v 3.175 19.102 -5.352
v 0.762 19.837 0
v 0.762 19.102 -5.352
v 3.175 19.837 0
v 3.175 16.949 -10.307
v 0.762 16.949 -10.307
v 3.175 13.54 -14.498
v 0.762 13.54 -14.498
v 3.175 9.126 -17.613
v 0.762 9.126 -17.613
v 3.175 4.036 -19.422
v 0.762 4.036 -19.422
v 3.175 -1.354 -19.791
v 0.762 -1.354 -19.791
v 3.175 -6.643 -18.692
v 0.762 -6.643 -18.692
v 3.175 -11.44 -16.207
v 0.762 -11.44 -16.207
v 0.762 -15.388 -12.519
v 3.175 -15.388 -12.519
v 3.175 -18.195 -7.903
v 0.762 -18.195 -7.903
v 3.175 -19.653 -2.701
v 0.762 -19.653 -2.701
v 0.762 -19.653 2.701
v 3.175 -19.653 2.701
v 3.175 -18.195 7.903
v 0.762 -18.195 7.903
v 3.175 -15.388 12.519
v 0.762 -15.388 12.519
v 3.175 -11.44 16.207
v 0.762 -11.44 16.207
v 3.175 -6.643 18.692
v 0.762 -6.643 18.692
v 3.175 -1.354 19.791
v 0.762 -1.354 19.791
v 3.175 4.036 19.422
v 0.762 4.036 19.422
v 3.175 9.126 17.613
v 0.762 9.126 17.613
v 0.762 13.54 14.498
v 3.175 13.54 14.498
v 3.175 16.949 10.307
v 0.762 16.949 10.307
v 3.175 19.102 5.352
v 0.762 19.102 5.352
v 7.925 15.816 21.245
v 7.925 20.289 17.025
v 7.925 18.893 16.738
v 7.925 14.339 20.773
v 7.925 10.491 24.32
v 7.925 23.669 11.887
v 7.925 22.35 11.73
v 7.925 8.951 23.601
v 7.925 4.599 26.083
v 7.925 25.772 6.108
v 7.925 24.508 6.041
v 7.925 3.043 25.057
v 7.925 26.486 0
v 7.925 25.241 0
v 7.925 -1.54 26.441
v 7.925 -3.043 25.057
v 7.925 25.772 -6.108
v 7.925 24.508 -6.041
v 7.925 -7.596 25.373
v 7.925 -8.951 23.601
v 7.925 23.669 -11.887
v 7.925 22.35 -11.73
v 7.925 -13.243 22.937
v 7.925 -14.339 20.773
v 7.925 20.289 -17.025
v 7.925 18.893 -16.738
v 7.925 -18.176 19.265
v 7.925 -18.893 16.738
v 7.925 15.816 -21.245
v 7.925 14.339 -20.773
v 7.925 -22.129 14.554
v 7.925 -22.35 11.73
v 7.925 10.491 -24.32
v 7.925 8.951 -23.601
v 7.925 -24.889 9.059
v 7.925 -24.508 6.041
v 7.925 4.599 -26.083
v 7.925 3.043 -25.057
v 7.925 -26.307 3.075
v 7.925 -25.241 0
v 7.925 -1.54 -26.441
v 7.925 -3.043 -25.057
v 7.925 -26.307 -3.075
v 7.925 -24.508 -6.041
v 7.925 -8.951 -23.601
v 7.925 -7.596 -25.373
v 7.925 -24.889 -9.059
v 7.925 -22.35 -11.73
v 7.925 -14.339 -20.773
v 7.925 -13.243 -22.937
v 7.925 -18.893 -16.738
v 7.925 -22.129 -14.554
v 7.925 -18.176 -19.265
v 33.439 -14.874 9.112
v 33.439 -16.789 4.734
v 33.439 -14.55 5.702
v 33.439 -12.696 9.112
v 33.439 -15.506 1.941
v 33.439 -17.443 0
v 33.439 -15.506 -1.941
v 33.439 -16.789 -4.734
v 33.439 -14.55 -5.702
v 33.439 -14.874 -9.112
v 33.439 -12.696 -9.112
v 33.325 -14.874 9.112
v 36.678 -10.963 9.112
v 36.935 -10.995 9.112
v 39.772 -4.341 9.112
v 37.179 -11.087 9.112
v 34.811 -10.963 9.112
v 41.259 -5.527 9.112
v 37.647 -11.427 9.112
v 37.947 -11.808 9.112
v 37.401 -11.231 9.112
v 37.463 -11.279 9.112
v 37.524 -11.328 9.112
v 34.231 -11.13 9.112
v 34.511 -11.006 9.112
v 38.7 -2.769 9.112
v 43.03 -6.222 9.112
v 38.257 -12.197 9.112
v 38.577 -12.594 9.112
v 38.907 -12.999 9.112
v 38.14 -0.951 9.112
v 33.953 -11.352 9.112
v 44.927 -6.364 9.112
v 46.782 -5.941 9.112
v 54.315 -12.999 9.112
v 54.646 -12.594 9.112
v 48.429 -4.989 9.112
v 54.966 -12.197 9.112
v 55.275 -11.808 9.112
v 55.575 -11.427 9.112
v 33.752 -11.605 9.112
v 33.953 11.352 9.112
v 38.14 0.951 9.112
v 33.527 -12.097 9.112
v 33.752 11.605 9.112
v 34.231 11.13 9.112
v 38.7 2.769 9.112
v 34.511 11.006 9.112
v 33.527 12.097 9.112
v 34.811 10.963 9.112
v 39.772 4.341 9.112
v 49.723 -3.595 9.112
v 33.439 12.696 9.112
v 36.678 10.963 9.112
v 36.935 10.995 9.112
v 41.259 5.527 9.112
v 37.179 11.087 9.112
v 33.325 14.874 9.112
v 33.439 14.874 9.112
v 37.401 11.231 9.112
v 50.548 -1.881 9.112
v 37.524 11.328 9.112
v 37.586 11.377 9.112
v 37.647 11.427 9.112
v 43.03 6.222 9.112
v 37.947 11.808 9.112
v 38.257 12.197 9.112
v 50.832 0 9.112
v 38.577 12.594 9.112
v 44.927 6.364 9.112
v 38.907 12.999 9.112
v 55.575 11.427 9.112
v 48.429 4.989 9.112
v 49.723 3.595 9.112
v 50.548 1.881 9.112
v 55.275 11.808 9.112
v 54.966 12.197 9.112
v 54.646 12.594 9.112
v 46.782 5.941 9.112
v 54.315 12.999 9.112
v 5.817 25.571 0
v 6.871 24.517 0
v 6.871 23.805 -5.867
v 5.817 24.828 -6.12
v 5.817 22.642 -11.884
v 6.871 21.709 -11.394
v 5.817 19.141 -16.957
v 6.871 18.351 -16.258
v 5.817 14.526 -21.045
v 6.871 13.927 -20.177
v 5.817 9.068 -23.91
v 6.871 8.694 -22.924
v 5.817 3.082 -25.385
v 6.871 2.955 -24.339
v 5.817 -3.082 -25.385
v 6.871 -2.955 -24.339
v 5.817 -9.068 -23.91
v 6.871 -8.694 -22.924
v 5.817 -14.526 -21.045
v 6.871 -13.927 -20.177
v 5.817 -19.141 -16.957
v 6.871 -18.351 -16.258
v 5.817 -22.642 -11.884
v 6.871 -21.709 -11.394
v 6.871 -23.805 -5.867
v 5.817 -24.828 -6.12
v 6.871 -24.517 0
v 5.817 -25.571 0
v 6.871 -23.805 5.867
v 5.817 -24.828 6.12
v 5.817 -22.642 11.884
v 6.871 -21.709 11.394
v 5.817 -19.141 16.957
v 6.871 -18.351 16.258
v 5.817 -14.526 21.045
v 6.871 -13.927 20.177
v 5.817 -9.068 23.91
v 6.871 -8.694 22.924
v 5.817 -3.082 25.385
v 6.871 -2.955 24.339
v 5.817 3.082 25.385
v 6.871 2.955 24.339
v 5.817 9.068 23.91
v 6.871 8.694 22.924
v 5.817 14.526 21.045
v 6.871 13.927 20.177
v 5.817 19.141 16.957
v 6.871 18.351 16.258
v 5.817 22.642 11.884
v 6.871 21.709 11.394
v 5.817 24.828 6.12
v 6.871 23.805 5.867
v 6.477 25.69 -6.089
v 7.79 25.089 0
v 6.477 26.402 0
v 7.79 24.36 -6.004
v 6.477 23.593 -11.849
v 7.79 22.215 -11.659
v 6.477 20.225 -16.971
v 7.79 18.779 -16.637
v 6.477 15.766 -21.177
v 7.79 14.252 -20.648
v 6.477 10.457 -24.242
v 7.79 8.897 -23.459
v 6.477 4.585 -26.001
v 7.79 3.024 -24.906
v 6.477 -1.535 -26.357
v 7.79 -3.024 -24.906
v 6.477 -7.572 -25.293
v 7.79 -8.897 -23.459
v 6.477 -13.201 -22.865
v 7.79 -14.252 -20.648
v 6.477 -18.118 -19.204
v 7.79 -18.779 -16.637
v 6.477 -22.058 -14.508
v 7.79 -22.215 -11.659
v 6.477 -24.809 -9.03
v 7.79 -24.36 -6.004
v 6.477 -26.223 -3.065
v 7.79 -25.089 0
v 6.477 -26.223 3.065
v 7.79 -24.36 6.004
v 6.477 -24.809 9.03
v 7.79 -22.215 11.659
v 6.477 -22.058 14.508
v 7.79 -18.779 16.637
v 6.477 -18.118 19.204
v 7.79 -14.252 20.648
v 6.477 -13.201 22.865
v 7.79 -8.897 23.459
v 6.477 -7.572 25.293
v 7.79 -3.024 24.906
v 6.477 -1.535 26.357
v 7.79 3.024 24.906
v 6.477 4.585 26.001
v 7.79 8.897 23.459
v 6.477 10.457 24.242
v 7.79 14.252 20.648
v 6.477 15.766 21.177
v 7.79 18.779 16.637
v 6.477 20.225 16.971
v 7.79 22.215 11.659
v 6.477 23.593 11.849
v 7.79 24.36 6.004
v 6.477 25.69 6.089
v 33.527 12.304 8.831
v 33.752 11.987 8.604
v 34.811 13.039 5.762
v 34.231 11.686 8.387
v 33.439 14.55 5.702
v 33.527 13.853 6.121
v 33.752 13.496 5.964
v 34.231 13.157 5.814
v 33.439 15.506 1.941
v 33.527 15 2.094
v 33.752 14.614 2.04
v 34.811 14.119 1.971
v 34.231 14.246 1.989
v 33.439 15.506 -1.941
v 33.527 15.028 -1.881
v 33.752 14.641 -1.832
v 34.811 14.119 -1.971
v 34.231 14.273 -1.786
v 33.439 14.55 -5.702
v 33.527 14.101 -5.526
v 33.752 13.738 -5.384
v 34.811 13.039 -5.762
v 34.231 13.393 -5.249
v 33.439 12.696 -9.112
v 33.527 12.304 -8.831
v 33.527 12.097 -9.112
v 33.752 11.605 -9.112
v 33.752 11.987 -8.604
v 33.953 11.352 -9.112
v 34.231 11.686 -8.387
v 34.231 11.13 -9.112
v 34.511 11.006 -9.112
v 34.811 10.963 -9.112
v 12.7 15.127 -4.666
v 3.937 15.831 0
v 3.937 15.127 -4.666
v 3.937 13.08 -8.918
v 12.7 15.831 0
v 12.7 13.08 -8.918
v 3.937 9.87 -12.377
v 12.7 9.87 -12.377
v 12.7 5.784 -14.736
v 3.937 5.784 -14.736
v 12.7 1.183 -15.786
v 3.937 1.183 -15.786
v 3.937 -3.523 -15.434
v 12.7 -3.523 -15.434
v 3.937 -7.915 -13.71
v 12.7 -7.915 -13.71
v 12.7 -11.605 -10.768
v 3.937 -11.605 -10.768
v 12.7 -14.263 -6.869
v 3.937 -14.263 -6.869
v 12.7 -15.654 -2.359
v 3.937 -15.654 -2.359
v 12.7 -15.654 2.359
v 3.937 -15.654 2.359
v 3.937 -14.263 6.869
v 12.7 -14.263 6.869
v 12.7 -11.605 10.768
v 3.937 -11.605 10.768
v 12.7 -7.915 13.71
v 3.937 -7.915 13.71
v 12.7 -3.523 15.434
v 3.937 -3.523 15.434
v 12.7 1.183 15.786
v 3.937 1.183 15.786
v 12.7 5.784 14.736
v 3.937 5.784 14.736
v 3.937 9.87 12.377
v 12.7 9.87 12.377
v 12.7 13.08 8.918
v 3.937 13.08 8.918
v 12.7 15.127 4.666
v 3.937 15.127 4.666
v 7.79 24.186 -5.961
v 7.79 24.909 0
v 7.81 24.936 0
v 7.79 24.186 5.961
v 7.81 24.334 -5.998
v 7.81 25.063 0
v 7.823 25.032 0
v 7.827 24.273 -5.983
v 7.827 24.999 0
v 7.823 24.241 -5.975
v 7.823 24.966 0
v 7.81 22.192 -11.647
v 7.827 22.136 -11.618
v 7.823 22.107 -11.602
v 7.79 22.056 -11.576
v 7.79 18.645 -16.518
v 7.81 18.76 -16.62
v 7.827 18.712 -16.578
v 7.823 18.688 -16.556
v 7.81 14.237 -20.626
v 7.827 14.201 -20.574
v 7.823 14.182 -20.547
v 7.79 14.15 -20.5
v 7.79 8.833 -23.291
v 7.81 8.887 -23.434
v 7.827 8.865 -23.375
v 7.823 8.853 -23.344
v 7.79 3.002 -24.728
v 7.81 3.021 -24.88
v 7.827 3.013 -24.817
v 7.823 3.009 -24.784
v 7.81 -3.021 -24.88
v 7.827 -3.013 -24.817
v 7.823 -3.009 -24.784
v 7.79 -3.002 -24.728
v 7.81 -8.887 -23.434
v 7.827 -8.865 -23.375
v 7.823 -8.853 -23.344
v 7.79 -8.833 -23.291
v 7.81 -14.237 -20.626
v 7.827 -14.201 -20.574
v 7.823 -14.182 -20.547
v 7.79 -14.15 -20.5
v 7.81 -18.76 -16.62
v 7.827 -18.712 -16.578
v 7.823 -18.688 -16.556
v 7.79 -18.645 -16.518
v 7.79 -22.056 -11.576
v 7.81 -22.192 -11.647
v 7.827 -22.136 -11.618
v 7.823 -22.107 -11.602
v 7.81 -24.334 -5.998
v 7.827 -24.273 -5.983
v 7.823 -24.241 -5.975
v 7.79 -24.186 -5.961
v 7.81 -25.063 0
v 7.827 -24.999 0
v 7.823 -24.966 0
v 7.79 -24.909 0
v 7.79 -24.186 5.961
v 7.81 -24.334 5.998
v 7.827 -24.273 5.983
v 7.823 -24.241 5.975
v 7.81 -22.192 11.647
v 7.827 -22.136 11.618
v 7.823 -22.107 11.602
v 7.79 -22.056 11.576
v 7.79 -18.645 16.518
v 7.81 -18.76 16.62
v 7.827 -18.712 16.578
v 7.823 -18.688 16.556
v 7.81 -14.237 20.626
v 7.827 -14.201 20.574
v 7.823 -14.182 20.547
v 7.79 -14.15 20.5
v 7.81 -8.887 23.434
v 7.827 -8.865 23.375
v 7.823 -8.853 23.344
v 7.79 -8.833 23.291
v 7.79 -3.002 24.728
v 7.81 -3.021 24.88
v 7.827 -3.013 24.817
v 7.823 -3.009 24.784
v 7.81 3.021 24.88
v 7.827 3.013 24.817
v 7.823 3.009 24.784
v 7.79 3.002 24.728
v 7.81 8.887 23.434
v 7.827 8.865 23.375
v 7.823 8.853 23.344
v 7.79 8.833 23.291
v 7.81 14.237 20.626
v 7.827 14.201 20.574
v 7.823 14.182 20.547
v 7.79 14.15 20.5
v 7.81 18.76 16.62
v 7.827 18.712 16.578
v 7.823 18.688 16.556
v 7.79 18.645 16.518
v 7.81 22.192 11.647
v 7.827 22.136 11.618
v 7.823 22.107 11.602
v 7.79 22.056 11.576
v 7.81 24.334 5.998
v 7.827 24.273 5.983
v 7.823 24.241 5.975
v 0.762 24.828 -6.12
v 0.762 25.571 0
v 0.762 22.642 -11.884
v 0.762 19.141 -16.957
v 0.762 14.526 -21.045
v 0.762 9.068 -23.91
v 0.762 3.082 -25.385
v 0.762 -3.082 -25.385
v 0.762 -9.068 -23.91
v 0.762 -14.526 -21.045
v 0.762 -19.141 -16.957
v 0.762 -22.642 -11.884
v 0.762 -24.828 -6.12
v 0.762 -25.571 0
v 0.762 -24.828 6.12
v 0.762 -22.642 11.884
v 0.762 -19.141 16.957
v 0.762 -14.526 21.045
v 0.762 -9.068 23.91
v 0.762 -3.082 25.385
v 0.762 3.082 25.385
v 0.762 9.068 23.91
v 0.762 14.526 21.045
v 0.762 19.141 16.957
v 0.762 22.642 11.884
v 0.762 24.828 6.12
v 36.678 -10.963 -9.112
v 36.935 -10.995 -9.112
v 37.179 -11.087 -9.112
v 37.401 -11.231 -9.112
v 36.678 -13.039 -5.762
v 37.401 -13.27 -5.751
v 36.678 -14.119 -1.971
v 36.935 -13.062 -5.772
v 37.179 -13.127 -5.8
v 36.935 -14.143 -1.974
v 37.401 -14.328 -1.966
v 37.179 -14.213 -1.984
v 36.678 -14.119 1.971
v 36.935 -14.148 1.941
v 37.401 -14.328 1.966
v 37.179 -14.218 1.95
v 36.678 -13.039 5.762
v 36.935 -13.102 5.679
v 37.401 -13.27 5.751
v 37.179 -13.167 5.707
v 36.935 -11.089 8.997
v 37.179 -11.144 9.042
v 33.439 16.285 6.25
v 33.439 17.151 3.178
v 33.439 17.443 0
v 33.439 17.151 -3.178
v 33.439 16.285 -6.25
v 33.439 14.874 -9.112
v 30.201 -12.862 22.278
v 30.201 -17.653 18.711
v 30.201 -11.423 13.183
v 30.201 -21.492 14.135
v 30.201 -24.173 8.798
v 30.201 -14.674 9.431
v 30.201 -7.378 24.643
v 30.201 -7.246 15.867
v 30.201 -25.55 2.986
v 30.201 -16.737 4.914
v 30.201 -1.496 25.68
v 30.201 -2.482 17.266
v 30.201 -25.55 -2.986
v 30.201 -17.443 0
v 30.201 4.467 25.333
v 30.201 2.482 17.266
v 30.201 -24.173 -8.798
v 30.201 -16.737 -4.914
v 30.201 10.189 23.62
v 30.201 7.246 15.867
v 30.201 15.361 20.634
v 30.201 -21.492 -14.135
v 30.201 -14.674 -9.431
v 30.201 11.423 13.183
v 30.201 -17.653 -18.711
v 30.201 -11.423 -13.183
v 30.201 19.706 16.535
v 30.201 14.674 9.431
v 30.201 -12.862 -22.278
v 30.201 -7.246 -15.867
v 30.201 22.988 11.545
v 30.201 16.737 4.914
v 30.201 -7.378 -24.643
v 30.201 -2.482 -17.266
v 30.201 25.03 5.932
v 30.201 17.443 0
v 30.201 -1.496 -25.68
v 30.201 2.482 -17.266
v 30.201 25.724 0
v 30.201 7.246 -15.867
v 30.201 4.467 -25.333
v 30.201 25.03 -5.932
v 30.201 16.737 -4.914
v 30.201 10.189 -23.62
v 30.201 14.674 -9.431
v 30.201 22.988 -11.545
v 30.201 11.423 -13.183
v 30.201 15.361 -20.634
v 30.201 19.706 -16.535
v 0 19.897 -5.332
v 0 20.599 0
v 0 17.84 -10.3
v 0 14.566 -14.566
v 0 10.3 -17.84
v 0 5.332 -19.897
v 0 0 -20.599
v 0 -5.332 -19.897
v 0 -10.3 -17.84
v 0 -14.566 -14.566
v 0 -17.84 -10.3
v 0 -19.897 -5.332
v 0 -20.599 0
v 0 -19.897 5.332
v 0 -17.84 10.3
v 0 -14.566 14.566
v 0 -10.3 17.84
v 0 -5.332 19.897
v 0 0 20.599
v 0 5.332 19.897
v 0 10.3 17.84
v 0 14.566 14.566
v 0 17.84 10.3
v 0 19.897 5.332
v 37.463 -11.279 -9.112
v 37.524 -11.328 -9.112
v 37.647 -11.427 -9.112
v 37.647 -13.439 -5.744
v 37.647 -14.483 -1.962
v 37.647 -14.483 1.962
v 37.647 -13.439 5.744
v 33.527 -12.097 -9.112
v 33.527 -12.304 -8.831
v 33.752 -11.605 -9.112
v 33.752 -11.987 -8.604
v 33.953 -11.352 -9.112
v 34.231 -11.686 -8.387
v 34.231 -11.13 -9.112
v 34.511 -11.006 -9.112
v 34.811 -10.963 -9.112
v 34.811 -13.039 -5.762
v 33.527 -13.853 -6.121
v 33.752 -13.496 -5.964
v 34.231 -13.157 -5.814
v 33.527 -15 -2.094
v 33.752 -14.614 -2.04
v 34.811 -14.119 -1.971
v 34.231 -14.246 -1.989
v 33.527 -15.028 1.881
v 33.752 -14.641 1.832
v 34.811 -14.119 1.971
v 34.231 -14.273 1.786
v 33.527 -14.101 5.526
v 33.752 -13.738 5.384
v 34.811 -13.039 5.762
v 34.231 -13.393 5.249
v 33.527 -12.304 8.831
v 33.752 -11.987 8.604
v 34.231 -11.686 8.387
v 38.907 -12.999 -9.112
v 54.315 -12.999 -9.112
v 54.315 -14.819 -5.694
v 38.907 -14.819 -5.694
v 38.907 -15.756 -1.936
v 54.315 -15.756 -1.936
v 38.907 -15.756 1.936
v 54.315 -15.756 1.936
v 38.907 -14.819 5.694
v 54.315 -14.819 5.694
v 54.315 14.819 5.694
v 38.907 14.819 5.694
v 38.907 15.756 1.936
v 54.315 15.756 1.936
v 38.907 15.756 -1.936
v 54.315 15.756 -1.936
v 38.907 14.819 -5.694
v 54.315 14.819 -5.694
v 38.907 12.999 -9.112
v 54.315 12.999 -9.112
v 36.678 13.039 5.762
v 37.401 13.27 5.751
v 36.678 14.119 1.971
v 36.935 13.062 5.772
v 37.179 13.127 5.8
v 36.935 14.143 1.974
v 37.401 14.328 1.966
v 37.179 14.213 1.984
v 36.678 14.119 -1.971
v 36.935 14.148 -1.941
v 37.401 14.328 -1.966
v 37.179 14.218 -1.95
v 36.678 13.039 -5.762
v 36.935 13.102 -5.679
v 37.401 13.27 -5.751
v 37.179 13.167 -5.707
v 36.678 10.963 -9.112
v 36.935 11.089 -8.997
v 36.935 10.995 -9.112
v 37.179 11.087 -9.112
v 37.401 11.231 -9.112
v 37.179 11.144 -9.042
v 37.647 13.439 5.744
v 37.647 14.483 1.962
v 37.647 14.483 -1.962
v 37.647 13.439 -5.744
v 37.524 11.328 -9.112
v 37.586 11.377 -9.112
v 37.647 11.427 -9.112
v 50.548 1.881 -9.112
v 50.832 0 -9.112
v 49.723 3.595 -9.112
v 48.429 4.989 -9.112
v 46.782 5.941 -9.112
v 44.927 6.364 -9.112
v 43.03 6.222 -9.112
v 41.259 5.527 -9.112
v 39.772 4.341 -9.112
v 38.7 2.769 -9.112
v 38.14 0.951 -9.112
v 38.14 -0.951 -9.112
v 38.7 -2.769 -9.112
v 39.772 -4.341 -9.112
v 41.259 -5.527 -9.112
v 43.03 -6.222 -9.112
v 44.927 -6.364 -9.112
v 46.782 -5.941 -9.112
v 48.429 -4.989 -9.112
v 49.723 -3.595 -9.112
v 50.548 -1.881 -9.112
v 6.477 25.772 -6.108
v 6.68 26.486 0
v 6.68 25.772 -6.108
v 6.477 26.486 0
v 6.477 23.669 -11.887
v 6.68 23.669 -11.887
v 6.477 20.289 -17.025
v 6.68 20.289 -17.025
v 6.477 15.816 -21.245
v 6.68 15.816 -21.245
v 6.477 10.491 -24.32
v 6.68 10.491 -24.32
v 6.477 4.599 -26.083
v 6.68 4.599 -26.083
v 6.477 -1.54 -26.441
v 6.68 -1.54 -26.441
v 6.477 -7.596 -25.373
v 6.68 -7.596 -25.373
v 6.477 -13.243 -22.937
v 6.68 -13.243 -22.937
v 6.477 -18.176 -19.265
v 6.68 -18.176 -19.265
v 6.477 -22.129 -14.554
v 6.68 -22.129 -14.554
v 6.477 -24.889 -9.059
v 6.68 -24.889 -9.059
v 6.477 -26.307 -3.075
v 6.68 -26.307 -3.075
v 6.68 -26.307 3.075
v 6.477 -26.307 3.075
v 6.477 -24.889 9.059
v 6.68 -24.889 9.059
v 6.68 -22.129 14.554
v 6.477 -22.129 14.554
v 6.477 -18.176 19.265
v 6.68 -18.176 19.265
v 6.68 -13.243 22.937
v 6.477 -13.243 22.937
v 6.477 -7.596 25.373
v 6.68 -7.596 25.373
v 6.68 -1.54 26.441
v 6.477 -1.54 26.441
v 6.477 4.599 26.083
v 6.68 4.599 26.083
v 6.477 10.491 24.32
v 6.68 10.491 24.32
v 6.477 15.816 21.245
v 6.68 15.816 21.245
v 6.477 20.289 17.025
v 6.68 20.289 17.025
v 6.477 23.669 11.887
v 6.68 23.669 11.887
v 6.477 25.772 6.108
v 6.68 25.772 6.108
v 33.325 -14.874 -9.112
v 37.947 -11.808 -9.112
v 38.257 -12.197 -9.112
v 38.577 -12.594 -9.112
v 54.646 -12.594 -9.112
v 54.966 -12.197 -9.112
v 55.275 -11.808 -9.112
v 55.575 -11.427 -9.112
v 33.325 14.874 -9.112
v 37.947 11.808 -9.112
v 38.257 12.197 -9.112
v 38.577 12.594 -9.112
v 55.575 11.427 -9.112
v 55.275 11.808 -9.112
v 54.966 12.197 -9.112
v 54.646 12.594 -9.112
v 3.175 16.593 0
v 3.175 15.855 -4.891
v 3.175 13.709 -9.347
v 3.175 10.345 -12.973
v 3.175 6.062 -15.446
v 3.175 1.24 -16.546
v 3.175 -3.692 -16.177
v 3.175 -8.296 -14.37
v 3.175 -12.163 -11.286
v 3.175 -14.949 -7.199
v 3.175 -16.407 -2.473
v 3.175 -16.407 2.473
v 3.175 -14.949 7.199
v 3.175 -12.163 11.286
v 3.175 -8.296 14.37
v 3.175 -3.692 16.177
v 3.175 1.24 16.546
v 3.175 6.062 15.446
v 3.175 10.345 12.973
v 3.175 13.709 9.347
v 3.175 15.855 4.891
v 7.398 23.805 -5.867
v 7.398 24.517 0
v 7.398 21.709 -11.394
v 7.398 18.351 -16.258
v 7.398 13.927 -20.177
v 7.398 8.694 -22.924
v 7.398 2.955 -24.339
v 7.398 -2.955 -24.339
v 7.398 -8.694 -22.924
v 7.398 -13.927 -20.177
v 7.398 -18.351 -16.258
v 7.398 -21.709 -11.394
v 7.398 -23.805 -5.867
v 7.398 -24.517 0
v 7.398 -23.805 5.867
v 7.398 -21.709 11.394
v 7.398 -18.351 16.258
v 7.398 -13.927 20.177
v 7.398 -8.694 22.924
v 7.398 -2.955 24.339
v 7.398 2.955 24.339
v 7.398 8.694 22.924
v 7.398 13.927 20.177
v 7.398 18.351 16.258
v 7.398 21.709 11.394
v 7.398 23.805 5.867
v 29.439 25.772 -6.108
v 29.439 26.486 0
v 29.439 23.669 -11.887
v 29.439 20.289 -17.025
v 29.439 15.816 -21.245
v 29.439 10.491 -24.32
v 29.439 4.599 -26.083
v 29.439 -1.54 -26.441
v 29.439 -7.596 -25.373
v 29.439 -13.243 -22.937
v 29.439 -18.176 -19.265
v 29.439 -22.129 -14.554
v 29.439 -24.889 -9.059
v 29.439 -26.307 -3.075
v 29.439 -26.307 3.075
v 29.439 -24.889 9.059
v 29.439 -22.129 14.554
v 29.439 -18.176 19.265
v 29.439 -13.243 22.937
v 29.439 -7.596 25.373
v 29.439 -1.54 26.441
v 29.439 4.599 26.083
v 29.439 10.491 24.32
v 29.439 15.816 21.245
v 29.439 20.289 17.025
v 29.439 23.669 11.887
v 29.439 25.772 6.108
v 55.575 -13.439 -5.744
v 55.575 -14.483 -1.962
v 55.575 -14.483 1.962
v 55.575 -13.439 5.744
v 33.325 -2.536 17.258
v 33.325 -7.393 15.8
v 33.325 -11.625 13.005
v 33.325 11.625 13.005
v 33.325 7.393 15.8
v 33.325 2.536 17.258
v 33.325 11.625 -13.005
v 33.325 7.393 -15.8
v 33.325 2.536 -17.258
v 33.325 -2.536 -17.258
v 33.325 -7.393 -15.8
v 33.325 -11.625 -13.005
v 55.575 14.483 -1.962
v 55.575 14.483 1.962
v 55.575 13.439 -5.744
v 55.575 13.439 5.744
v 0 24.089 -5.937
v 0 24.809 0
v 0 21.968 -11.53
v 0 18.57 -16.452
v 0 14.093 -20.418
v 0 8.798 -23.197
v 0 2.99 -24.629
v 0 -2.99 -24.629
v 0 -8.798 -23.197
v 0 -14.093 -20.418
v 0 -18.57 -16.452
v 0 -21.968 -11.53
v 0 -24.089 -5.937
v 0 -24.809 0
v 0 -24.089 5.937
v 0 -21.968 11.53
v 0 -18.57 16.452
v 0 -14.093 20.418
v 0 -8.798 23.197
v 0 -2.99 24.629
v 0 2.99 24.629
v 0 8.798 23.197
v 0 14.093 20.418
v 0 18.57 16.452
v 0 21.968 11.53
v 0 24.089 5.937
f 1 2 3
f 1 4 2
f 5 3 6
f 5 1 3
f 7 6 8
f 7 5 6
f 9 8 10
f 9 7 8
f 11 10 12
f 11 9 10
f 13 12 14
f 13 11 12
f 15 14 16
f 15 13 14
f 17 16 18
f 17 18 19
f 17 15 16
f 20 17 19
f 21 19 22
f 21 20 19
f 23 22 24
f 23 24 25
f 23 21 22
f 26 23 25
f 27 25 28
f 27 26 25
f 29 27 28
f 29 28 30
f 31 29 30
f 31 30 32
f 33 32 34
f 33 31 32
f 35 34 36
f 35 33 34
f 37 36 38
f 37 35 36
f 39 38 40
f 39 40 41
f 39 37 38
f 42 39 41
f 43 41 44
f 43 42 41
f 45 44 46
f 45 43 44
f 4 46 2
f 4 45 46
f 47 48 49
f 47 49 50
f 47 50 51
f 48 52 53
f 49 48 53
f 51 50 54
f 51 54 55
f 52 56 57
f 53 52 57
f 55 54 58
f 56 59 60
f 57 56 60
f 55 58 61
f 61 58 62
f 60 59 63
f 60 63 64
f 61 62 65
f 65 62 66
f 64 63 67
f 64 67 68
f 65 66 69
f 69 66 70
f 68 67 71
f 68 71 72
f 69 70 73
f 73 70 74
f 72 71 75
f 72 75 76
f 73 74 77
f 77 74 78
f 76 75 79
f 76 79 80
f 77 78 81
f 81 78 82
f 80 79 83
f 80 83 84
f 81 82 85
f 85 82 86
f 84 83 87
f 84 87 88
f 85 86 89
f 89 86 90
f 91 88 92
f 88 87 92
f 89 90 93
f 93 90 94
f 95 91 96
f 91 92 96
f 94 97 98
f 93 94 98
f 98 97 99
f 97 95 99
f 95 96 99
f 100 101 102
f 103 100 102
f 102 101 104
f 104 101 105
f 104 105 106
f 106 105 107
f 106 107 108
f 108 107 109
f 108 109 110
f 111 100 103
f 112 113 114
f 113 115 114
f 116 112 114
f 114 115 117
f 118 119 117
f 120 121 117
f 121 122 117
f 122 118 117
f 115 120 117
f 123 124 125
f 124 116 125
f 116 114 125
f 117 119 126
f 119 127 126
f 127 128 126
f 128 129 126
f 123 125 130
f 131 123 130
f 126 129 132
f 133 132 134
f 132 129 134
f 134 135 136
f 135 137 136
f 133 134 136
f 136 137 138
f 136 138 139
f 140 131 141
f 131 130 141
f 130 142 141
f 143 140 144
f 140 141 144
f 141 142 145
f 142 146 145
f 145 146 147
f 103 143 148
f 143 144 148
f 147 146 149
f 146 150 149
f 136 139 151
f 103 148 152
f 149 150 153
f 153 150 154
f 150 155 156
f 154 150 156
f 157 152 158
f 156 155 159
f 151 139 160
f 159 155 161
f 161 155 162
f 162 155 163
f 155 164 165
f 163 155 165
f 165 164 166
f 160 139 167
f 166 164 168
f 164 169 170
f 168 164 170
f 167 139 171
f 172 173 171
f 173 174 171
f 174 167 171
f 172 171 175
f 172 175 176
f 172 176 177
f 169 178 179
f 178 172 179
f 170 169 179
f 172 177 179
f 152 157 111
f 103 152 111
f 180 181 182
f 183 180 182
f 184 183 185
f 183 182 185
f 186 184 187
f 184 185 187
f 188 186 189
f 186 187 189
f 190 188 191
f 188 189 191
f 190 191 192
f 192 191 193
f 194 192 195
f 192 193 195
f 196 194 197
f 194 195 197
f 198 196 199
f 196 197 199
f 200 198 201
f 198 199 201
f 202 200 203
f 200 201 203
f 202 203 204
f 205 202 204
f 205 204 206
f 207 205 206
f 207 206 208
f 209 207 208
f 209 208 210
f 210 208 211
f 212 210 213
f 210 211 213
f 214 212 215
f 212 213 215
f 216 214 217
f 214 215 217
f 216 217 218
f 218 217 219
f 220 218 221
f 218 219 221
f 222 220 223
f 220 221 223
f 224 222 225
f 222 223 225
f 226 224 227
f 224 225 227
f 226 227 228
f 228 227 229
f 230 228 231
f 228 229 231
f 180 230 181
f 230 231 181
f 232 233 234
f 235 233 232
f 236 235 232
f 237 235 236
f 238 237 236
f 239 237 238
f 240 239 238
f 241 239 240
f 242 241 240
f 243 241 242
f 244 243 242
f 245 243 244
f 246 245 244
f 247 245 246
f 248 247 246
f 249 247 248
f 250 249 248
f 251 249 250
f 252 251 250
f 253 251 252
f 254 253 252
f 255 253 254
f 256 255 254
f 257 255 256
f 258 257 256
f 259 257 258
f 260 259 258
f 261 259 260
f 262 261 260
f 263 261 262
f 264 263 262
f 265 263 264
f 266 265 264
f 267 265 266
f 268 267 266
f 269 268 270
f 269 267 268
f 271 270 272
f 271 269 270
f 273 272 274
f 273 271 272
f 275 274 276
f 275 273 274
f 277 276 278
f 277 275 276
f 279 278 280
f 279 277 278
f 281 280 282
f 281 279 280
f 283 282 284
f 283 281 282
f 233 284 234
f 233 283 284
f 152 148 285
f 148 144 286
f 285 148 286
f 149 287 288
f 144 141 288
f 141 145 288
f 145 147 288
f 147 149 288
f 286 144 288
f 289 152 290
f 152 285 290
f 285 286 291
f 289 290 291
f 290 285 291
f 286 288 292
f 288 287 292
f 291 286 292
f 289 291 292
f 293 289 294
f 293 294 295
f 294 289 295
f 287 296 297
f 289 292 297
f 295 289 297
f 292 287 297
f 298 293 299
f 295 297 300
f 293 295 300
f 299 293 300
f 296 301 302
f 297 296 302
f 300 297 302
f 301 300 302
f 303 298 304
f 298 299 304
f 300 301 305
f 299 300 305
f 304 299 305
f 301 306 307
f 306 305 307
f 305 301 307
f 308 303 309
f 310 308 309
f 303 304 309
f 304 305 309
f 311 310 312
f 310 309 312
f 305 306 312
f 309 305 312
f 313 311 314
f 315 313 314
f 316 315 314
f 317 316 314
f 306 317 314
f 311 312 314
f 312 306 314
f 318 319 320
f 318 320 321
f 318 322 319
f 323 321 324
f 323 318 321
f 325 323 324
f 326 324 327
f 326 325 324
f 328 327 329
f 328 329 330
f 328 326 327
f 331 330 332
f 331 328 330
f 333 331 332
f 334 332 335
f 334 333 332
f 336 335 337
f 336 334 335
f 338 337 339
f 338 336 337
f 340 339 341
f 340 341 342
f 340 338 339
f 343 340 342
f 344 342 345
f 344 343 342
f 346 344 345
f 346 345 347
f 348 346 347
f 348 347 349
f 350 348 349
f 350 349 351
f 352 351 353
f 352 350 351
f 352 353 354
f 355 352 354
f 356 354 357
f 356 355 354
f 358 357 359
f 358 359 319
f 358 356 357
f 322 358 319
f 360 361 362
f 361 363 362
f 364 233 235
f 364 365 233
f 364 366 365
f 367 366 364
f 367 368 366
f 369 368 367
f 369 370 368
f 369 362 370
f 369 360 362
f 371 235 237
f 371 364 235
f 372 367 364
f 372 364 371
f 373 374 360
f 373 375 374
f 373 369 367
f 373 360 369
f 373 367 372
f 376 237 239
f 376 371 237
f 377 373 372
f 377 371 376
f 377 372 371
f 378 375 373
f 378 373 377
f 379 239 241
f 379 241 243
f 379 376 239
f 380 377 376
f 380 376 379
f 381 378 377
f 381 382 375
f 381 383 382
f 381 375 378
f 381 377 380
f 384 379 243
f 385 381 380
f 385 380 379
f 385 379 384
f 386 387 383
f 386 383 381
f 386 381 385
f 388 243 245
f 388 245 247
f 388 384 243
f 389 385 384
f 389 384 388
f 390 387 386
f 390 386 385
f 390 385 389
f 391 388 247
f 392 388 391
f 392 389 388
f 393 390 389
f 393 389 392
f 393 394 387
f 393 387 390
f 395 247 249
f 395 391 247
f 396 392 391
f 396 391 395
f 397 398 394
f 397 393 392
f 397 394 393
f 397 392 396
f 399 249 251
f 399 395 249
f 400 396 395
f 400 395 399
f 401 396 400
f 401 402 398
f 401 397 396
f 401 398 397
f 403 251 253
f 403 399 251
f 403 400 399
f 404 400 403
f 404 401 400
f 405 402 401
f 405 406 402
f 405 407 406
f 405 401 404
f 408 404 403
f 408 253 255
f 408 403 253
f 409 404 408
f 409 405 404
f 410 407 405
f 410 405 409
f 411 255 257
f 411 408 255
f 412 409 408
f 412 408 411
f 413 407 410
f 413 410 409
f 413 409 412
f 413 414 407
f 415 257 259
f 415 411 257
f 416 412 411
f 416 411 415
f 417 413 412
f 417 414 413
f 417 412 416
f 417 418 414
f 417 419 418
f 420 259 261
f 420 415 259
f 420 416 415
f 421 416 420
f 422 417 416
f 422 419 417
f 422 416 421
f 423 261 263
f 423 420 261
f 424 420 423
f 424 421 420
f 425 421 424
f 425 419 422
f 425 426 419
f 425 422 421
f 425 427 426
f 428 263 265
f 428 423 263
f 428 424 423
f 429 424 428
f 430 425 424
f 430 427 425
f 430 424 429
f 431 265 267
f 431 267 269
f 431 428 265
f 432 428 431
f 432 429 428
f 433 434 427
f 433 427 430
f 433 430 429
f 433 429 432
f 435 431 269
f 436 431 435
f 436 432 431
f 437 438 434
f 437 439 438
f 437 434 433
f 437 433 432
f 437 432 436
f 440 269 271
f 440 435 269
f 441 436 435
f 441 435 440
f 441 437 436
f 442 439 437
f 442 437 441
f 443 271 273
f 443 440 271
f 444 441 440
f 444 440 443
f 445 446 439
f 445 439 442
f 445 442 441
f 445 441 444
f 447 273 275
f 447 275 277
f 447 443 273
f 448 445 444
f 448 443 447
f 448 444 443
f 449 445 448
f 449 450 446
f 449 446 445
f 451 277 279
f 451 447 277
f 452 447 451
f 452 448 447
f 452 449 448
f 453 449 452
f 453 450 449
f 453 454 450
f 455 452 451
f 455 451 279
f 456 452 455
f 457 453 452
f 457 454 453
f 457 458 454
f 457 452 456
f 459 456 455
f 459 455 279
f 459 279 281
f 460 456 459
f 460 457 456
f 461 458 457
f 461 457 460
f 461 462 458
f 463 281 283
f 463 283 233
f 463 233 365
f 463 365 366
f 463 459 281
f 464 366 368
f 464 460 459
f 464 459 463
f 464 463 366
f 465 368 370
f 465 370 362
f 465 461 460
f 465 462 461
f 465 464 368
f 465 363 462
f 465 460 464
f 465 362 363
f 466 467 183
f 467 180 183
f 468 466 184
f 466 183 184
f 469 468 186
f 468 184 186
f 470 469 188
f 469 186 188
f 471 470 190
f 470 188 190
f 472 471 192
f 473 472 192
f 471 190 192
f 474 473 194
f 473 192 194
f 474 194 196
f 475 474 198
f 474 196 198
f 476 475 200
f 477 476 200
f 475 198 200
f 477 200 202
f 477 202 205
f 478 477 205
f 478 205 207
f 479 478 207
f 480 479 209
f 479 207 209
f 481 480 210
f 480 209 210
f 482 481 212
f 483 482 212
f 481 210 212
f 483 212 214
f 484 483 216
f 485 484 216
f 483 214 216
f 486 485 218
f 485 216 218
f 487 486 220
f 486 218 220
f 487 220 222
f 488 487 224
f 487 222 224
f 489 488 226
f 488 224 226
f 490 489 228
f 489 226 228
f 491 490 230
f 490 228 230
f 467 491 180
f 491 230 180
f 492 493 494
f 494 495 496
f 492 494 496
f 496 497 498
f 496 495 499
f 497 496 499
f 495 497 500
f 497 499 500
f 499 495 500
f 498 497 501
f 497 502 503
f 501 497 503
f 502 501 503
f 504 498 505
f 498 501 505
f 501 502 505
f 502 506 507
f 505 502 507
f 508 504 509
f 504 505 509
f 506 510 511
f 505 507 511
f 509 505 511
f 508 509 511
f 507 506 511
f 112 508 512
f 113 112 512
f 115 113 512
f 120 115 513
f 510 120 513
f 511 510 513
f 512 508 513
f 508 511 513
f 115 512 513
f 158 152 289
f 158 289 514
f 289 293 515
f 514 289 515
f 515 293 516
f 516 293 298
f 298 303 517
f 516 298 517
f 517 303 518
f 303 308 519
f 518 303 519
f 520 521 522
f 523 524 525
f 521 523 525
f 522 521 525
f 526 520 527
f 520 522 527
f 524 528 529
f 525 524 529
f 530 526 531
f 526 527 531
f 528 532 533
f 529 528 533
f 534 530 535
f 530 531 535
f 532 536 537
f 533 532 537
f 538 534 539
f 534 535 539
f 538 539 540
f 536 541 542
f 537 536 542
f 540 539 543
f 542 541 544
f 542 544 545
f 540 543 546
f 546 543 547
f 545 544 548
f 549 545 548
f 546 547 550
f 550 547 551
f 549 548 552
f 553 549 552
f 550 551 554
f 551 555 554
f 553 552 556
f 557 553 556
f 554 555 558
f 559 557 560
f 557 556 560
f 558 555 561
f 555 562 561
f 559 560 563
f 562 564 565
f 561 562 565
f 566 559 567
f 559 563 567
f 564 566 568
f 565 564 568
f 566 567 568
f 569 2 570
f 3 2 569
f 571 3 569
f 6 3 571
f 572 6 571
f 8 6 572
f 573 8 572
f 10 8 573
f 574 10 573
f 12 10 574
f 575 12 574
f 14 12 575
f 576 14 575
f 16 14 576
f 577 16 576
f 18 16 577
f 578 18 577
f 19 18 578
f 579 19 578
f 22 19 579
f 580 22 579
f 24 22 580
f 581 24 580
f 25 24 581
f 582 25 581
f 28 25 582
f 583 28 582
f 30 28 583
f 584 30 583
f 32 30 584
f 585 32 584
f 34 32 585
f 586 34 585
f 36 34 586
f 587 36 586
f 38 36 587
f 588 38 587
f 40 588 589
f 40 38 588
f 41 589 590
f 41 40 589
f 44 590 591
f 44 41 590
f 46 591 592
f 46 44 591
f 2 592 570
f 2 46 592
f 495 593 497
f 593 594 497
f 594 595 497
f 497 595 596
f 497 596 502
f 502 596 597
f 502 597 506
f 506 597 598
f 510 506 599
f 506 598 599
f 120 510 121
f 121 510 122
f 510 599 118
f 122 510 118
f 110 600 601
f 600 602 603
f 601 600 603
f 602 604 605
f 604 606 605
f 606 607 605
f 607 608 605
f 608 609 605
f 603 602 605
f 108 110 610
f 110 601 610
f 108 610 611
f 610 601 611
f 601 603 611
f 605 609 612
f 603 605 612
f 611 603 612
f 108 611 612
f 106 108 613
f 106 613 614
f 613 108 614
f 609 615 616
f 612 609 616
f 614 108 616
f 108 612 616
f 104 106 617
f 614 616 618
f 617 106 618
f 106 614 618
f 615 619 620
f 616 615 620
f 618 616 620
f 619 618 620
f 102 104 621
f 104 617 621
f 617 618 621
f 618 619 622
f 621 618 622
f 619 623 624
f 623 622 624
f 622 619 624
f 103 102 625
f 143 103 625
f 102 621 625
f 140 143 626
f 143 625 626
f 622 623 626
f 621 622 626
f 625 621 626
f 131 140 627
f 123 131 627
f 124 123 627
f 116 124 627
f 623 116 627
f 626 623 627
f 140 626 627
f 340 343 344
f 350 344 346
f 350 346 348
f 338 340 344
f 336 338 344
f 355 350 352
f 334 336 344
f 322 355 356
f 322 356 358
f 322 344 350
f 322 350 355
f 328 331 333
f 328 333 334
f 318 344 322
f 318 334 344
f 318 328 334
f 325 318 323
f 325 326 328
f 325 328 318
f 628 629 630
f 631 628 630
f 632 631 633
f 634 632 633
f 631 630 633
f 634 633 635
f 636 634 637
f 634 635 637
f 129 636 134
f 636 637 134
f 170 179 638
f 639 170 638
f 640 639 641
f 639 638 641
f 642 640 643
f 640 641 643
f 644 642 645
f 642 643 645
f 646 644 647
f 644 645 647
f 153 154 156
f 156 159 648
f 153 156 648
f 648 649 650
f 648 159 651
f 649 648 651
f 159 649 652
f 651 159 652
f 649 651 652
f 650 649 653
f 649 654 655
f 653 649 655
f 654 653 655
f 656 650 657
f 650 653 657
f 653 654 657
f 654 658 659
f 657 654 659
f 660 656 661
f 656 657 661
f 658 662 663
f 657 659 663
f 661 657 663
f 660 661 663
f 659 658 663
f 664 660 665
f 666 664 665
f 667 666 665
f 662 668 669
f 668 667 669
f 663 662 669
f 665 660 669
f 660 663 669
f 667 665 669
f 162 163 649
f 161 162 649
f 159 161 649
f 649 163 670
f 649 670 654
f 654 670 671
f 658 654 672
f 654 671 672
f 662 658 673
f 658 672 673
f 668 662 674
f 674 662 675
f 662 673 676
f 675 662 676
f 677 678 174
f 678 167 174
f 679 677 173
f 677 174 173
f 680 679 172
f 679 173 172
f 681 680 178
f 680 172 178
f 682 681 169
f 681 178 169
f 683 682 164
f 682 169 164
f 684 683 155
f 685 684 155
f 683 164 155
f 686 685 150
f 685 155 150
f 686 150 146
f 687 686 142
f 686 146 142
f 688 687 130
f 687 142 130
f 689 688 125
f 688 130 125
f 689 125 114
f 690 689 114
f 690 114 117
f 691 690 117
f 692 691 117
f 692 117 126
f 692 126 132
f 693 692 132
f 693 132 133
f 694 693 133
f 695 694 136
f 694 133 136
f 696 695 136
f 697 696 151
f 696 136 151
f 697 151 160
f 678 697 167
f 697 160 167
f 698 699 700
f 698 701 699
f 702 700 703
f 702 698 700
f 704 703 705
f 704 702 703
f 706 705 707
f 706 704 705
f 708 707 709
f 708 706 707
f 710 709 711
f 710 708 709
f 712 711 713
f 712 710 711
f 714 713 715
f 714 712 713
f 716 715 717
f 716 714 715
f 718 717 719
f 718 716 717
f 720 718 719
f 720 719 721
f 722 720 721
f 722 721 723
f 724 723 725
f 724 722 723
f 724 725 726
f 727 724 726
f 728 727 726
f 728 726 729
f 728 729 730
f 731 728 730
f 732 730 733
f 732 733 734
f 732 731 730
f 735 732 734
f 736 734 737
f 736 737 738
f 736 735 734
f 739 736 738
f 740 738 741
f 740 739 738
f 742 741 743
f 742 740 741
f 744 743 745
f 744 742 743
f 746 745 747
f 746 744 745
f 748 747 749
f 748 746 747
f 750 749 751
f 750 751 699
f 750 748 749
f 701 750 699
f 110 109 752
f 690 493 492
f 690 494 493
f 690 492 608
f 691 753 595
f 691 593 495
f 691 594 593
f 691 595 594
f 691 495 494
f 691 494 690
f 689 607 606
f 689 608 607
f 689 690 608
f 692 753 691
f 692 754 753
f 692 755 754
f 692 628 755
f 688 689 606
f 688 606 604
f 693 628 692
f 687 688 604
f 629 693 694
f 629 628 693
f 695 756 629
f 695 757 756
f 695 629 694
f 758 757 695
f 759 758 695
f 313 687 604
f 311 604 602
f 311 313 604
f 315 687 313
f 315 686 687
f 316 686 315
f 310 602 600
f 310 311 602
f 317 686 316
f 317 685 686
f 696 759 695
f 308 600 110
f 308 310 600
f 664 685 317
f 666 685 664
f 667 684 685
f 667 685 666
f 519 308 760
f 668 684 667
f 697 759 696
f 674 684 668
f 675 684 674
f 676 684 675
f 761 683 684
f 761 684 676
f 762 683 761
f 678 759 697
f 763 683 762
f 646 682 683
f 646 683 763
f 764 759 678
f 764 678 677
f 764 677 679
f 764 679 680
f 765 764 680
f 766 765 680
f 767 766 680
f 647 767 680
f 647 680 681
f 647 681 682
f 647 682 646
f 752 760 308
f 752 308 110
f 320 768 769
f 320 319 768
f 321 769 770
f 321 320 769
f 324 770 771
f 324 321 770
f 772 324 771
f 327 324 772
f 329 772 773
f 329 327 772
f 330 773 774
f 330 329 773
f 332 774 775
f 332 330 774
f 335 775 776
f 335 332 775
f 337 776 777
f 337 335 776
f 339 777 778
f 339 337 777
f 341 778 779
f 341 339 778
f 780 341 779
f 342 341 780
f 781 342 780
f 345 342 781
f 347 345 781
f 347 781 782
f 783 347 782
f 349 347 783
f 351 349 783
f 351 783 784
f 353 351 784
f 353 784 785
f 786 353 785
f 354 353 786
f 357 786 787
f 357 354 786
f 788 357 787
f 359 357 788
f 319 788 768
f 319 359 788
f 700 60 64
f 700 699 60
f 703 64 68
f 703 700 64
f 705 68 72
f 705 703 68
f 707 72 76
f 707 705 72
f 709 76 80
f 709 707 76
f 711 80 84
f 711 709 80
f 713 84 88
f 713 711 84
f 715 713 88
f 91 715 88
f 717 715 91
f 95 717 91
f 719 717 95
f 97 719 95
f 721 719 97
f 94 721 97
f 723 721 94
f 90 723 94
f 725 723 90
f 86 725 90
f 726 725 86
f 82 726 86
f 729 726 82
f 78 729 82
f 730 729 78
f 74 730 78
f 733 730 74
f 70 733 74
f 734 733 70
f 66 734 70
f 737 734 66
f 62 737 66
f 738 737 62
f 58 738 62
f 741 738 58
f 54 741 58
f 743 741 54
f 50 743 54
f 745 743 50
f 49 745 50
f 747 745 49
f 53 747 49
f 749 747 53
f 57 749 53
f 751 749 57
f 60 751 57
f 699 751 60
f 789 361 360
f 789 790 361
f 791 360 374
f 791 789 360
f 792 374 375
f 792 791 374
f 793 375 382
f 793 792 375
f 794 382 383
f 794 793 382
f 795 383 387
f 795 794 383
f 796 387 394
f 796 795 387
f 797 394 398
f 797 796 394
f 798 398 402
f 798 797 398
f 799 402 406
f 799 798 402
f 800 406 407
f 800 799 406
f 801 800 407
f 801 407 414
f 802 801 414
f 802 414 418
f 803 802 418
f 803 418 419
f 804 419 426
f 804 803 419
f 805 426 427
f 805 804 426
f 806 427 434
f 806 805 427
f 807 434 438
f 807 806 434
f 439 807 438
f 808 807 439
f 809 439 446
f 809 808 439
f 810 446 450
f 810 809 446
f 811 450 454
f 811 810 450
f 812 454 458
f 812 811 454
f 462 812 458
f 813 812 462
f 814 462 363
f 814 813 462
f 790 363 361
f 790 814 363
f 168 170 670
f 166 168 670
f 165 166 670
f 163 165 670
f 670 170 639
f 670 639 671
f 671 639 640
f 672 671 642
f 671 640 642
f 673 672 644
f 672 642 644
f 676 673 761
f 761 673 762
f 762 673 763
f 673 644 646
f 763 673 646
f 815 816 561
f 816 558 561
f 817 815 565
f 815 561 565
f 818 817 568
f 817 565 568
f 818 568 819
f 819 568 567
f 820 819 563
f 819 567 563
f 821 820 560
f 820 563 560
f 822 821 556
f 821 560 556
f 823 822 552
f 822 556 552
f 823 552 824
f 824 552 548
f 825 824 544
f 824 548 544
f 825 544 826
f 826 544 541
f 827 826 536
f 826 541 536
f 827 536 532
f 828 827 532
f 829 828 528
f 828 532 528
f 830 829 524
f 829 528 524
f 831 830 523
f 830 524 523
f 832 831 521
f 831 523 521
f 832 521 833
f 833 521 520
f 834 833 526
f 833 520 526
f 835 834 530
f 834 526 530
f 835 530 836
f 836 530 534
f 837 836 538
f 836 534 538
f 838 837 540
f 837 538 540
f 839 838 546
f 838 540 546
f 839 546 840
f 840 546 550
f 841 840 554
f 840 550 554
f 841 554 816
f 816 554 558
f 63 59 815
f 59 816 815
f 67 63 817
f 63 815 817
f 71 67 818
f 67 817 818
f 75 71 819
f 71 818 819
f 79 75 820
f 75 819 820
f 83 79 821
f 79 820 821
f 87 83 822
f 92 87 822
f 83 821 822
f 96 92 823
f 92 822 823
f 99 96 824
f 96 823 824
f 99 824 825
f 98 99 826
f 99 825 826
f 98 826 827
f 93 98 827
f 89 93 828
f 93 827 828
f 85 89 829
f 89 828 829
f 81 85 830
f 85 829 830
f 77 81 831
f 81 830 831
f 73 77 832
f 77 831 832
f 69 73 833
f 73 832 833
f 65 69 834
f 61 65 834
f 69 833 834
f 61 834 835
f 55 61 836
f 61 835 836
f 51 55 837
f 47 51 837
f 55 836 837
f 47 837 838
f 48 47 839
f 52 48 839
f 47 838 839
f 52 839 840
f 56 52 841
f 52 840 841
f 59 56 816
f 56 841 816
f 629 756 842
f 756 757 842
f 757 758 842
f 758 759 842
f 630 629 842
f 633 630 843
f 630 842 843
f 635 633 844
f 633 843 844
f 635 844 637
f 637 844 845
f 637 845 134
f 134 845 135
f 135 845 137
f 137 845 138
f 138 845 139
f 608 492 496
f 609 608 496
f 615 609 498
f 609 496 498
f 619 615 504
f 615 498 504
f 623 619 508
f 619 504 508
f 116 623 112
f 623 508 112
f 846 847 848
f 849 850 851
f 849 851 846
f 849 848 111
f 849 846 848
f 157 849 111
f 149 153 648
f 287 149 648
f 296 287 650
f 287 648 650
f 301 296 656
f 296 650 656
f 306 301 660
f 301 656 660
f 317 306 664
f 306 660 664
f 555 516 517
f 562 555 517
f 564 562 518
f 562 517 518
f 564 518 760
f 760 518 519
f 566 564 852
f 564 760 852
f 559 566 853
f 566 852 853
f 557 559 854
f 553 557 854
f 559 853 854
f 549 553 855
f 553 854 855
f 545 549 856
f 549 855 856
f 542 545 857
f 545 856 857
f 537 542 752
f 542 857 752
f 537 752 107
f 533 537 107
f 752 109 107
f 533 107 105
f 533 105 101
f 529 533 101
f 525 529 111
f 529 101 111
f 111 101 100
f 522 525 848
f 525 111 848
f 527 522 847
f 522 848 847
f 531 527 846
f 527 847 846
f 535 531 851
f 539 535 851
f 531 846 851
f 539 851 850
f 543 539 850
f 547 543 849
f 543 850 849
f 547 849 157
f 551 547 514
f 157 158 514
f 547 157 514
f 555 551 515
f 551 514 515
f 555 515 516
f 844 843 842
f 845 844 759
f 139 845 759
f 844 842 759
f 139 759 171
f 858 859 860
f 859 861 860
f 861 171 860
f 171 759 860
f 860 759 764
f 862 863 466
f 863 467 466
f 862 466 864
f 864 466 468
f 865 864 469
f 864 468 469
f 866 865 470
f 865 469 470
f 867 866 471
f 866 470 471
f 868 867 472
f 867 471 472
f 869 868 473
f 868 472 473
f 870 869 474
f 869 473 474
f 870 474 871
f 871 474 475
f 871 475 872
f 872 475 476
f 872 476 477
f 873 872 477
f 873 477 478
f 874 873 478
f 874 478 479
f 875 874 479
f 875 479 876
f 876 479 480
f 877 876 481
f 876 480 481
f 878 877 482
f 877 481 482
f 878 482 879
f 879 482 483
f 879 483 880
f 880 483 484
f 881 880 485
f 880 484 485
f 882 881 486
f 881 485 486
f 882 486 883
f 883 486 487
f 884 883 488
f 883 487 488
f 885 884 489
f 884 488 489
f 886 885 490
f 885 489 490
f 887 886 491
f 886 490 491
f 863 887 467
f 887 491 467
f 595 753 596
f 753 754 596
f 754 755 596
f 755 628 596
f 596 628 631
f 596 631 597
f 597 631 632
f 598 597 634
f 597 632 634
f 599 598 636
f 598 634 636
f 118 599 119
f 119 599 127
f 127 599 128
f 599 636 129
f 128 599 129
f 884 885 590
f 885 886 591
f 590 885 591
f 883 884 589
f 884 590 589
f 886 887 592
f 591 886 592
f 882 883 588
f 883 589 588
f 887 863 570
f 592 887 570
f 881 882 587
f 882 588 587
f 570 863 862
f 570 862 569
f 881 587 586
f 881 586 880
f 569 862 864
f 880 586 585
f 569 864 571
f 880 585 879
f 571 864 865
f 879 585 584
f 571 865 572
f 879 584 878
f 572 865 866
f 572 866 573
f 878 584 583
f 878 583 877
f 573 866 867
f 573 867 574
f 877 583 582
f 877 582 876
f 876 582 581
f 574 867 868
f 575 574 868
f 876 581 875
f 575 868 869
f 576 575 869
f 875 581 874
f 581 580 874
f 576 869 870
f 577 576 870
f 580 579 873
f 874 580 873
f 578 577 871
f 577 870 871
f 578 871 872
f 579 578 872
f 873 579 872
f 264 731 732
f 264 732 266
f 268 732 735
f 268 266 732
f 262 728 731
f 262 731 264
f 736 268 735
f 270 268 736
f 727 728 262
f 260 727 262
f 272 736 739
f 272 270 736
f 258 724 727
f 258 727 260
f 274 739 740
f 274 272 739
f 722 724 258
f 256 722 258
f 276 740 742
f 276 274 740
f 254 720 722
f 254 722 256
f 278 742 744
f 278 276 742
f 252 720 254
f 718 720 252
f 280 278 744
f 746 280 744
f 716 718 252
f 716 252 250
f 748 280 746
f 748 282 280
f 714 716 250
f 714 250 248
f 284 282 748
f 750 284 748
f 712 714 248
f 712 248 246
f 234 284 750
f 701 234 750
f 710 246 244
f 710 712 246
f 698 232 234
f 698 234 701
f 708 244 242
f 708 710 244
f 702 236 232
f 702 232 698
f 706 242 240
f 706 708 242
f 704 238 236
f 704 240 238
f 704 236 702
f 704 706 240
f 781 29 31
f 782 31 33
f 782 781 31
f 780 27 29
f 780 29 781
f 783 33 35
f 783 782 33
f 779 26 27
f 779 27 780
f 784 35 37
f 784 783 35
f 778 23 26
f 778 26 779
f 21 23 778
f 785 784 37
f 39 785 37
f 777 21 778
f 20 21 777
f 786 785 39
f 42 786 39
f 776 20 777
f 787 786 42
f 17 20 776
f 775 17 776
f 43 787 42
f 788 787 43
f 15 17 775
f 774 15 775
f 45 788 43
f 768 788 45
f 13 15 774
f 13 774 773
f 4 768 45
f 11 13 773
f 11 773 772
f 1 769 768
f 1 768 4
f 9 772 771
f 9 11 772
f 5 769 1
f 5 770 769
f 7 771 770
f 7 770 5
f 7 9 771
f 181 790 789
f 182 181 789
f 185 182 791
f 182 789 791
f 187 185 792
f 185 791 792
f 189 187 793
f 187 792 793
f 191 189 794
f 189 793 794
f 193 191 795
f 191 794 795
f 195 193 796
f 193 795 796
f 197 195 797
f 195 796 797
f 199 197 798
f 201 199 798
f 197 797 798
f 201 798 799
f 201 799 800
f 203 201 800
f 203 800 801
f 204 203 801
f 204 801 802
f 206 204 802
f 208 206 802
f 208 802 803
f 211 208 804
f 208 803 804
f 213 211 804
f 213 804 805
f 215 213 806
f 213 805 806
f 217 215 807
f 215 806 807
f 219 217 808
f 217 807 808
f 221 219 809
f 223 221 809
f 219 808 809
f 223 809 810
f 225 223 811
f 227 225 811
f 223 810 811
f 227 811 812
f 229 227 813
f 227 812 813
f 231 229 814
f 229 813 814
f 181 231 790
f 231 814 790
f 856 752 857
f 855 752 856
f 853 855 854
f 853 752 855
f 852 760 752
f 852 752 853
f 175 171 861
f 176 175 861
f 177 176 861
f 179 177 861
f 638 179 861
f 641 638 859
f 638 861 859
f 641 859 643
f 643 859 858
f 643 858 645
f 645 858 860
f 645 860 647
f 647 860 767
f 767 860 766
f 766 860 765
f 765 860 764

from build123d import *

# Parameters (mm, degrees)
SKETCH3_W               = 105.9434
SKETCH3_H               = 211.8868
SKETCH3_W_2             = 18.2245
SKETCH3_H_2             = 105.9434
CUT_EXTRUDE1_DEPTH      = 22.2504
CUT_EXTRUDE2_DEPTH      = 13.668375
CUT_EXTRUDE2_DEPTH_BACK = 13.668375
SKETCH5_R               = 6.38175


with BuildPart() as part:
    # Sketch1 → Revolve1 (revolve)
    with BuildSketch(Plane.XY):
        Polygon((0, 0), (0, 24.80945), (0.762, 25.57145), (5.8166, 25.57145), (6.8707, 24.51735), (7.9248, 24.51735), (7.9248, 26.48585), (29.4386, 26.48585), (30.2006, 25.72385), (30.2006, 0), align=None)
    revolve(axis=Axis((30.2006, 0, 0), (-1, 0, 0)))

    # Sketch2 → Revolve2 (revolve)
    with BuildSketch(Plane.XY):
        with BuildLine():
            Line((30.2006, 0), (30.2006, 17.44345))
            Line((30.2006, 17.44345), (33.4391, 17.44345))
            Line((33.4391, 17.44345), (33.4391, 15.62735))
            ThreePointArc((33.4391, 15.62735), (33.840832339, 14.657482339), (34.8107, 14.25575))
            Line((34.8107, 14.25575), (36.6776, 14.25575))
            ThreePointArc((36.6776, 14.25575), (37.053975321, 14.308400351), (37.401455494, 14.462309321))
            Line((37.401455494, 14.462309321), (37.647467661, 14.61516))
            Line((37.647467661, 14.61516), (38.907307661, 15.875))
            Line((38.907307661, 15.875), (54.31536, 15.875))
            Line((54.31536, 15.875), (55.5752, 14.61516))
            Line((55.5752, 14.61516), (55.5752, 0))
            Line((55.5752, 0), (30.2006, 0))
        make_face()
    revolve(axis=Axis((55.5752, 0, 0), (-1, 0, 0)))

    # Sketch3 → Cut-Extrude1 (cut)
    with BuildSketch(Plane(origin=(55.5752, 0, 0), x_dir=(0, 0, -1), z_dir=(1, 0, 0))):
        Rectangle(SKETCH3_W, SKETCH3_H)
        Rectangle(SKETCH3_W_2, SKETCH3_H_2, mode=Mode.SUBTRACT)
    extrude(amount=-CUT_EXTRUDE1_DEPTH, mode=Mode.SUBTRACT)

    # Sketch4 → Revolve3 (revolve)
    with BuildSketch(Plane.XY):
        with BuildLine():
            Line((6.477090712, 26.401681804), (7.789783697, 25.088988819))
            ThreePointArc((7.789783697, 25.088988819), (7.826981136, 24.999186258), (7.789783697, 24.909383697))
            Line((7.789783697, 24.909383697), (7.39775, 24.51735))
            Line((7.39775, 24.51735), (6.8707, 24.51735))
            Line((6.8707, 24.51735), (6.8707, 24.26335))
            Line((6.8707, 24.26335), (7.9248, 24.26335))
            Line((7.9248, 24.26335), (7.9248, 25.241340712))
            Line((7.9248, 25.241340712), (6.680290712, 26.48585))
            Line((6.680290712, 26.48585), (6.477090712, 26.48585))
            Line((6.477090712, 26.48585), (6.477090712, 26.401681804))
        make_face()
    revolve(axis=Axis((7.9248, 0, 0), (-1, 0, 0)))

    # Sketch5 → Cut-Extrude2 (cut, two sides: drawn at the far end of the back side and taken through both)
    with BuildSketch(Plane.XY.offset(-CUT_EXTRUDE2_DEPTH_BACK)):
        with Locations((44.45, 0)):
            Circle(SKETCH5_R)
    extrude(amount=CUT_EXTRUDE2_DEPTH + CUT_EXTRUDE2_DEPTH_BACK, mode=Mode.SUBTRACT)

    # Sketch6 → Cut-Revolve1 (revolve, cut)
    with BuildSketch(Plane.XY):
        Polygon((0, 0), (0, 20.5994), (0.762, 19.8374), (3.175, 19.8374), (3.175, 16.59255), (3.937, 15.83055), (12.7, 15.83055), (12.7, 0), align=None)
    revolve(axis=Axis((12.7, 0, 0), (-1, 0, 0)), mode=Mode.SUBTRACT)


solid = part.part
